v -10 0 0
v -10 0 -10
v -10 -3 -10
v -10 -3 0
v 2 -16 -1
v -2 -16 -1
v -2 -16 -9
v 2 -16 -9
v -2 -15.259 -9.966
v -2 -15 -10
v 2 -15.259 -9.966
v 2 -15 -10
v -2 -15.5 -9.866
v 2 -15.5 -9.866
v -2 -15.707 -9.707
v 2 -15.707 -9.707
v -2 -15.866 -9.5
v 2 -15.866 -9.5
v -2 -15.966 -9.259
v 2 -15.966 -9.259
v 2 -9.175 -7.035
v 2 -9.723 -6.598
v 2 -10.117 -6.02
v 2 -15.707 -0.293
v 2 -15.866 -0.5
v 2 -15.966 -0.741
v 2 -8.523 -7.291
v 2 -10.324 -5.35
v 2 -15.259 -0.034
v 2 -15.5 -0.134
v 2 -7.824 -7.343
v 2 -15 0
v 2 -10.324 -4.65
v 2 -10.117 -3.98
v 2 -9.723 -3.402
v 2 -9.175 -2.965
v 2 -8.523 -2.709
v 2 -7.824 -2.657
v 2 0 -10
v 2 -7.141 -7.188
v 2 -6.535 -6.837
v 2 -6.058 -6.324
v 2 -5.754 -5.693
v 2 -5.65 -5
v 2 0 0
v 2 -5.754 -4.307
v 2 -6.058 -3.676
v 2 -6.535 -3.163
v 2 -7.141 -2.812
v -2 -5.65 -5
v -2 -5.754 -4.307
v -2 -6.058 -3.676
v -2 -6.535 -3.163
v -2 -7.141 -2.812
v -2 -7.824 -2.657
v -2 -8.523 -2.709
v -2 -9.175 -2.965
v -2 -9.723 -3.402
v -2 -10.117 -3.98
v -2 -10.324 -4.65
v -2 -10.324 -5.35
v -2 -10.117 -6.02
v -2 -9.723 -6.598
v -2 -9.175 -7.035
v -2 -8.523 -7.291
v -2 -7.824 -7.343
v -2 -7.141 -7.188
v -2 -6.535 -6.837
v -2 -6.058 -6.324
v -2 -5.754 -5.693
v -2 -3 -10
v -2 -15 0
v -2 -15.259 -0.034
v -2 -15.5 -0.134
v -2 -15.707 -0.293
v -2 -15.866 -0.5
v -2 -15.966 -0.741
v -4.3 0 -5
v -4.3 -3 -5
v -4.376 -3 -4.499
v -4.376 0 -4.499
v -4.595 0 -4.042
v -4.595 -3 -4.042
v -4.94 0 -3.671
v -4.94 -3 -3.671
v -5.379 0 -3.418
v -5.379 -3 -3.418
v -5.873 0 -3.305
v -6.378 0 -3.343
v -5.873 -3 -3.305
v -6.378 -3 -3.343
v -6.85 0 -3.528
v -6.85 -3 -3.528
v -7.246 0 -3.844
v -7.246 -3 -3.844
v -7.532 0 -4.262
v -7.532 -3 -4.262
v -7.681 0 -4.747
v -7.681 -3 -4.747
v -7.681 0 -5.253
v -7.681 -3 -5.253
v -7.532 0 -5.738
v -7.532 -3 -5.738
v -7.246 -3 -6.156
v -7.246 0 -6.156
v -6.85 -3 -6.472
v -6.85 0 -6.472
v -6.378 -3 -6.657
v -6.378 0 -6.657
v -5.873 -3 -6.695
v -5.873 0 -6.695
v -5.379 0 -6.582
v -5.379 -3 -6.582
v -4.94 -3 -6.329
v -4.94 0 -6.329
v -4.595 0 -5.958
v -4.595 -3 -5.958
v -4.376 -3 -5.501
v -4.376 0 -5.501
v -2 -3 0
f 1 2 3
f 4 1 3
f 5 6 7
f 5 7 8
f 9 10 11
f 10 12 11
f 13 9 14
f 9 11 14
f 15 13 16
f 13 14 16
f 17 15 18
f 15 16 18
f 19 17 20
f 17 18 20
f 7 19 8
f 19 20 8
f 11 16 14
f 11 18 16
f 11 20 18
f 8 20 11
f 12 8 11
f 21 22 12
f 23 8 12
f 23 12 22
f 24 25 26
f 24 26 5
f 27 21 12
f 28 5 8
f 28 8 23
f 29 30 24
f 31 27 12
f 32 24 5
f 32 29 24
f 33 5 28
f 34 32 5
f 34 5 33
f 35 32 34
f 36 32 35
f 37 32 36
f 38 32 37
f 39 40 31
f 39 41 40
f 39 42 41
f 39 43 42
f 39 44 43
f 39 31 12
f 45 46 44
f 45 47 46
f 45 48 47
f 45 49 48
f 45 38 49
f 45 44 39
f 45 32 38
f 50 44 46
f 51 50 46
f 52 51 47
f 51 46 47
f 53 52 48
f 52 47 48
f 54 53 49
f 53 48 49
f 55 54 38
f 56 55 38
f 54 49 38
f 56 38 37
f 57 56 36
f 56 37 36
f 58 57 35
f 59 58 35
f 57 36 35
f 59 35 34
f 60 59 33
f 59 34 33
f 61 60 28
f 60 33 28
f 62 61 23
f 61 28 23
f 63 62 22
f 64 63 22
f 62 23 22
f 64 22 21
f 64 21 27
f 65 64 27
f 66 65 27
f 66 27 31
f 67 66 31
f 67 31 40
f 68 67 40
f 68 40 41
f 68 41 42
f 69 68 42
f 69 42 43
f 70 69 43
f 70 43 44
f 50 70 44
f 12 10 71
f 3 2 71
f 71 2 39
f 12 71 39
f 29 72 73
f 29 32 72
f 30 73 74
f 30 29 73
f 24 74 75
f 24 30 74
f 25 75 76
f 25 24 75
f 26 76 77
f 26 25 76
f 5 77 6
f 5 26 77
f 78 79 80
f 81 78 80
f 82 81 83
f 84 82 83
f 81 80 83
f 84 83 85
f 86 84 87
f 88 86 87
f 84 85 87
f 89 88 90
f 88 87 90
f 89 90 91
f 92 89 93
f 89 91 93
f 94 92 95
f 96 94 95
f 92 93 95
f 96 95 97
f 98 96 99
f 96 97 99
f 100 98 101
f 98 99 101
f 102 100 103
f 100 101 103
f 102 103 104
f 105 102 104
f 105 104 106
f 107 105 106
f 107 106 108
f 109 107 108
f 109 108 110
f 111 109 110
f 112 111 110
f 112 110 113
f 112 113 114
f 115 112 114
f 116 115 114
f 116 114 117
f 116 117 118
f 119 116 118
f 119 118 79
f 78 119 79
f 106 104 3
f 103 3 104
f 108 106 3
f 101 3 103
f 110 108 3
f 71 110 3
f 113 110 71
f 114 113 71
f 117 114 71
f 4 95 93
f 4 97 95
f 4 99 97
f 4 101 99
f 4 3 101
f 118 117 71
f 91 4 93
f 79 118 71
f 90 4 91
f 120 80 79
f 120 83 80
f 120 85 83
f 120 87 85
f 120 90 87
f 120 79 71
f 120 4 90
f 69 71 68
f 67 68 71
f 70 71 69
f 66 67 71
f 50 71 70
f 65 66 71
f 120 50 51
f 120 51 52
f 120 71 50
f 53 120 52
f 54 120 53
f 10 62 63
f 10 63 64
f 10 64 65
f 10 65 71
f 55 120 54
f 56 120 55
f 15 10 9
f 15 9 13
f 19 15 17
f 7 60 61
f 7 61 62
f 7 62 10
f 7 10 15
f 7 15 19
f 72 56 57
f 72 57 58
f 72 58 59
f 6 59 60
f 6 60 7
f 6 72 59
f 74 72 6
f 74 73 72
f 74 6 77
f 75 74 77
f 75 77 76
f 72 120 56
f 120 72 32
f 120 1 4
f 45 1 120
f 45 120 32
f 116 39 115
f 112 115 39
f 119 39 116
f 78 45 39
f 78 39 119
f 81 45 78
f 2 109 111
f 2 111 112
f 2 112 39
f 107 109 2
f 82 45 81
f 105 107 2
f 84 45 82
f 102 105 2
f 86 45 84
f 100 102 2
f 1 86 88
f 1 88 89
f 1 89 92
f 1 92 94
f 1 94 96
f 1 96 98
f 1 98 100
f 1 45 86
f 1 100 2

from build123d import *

# Parameters (mm, degrees)
PAD001_DEPTH = 10
SKETCH002_R  = 1.7
HOLE_DEPTH   = 25
SKETCH003_R  = 2.35
POCKET_DEPTH = 5
FILLET_R     = 1


with BuildPart() as part:
    # Sketch001 → Pad001 (new body)
    with BuildSketch(Plane.XY):
        Polygon((-10, 0), (-10, -3), (-2, -3), (-2, -16), (2, -16), (2, 0), align=None)
    extrude(amount=-PAD001_DEPTH)

    # Sketch002 (on Face2 of Pad001) → Hole (cut)
    with BuildSketch(Plane.XZ.offset(3)):
        with Locations((-6, -5)):
            Circle(SKETCH002_R)
    extrude(amount=-HOLE_DEPTH, mode=Mode.SUBTRACT)

    # Sketch003 (on Face6 of Hole) → Pocket (cut)
    with BuildSketch(Plane.YZ.offset(2)):
        with Locations((-8, -5)):
            Circle(SKETCH003_R)
    extrude(amount=-POCKET_DEPTH, mode=Mode.SUBTRACT)

    # Fillet
    fillet_edges = [part.edges().sort_by_distance(p)[0] for p in [
        (0, -16, 0),
        (0, -16, -10),
    ]]
    fillet(fillet_edges, radius=FILLET_R)


solid = part.part
